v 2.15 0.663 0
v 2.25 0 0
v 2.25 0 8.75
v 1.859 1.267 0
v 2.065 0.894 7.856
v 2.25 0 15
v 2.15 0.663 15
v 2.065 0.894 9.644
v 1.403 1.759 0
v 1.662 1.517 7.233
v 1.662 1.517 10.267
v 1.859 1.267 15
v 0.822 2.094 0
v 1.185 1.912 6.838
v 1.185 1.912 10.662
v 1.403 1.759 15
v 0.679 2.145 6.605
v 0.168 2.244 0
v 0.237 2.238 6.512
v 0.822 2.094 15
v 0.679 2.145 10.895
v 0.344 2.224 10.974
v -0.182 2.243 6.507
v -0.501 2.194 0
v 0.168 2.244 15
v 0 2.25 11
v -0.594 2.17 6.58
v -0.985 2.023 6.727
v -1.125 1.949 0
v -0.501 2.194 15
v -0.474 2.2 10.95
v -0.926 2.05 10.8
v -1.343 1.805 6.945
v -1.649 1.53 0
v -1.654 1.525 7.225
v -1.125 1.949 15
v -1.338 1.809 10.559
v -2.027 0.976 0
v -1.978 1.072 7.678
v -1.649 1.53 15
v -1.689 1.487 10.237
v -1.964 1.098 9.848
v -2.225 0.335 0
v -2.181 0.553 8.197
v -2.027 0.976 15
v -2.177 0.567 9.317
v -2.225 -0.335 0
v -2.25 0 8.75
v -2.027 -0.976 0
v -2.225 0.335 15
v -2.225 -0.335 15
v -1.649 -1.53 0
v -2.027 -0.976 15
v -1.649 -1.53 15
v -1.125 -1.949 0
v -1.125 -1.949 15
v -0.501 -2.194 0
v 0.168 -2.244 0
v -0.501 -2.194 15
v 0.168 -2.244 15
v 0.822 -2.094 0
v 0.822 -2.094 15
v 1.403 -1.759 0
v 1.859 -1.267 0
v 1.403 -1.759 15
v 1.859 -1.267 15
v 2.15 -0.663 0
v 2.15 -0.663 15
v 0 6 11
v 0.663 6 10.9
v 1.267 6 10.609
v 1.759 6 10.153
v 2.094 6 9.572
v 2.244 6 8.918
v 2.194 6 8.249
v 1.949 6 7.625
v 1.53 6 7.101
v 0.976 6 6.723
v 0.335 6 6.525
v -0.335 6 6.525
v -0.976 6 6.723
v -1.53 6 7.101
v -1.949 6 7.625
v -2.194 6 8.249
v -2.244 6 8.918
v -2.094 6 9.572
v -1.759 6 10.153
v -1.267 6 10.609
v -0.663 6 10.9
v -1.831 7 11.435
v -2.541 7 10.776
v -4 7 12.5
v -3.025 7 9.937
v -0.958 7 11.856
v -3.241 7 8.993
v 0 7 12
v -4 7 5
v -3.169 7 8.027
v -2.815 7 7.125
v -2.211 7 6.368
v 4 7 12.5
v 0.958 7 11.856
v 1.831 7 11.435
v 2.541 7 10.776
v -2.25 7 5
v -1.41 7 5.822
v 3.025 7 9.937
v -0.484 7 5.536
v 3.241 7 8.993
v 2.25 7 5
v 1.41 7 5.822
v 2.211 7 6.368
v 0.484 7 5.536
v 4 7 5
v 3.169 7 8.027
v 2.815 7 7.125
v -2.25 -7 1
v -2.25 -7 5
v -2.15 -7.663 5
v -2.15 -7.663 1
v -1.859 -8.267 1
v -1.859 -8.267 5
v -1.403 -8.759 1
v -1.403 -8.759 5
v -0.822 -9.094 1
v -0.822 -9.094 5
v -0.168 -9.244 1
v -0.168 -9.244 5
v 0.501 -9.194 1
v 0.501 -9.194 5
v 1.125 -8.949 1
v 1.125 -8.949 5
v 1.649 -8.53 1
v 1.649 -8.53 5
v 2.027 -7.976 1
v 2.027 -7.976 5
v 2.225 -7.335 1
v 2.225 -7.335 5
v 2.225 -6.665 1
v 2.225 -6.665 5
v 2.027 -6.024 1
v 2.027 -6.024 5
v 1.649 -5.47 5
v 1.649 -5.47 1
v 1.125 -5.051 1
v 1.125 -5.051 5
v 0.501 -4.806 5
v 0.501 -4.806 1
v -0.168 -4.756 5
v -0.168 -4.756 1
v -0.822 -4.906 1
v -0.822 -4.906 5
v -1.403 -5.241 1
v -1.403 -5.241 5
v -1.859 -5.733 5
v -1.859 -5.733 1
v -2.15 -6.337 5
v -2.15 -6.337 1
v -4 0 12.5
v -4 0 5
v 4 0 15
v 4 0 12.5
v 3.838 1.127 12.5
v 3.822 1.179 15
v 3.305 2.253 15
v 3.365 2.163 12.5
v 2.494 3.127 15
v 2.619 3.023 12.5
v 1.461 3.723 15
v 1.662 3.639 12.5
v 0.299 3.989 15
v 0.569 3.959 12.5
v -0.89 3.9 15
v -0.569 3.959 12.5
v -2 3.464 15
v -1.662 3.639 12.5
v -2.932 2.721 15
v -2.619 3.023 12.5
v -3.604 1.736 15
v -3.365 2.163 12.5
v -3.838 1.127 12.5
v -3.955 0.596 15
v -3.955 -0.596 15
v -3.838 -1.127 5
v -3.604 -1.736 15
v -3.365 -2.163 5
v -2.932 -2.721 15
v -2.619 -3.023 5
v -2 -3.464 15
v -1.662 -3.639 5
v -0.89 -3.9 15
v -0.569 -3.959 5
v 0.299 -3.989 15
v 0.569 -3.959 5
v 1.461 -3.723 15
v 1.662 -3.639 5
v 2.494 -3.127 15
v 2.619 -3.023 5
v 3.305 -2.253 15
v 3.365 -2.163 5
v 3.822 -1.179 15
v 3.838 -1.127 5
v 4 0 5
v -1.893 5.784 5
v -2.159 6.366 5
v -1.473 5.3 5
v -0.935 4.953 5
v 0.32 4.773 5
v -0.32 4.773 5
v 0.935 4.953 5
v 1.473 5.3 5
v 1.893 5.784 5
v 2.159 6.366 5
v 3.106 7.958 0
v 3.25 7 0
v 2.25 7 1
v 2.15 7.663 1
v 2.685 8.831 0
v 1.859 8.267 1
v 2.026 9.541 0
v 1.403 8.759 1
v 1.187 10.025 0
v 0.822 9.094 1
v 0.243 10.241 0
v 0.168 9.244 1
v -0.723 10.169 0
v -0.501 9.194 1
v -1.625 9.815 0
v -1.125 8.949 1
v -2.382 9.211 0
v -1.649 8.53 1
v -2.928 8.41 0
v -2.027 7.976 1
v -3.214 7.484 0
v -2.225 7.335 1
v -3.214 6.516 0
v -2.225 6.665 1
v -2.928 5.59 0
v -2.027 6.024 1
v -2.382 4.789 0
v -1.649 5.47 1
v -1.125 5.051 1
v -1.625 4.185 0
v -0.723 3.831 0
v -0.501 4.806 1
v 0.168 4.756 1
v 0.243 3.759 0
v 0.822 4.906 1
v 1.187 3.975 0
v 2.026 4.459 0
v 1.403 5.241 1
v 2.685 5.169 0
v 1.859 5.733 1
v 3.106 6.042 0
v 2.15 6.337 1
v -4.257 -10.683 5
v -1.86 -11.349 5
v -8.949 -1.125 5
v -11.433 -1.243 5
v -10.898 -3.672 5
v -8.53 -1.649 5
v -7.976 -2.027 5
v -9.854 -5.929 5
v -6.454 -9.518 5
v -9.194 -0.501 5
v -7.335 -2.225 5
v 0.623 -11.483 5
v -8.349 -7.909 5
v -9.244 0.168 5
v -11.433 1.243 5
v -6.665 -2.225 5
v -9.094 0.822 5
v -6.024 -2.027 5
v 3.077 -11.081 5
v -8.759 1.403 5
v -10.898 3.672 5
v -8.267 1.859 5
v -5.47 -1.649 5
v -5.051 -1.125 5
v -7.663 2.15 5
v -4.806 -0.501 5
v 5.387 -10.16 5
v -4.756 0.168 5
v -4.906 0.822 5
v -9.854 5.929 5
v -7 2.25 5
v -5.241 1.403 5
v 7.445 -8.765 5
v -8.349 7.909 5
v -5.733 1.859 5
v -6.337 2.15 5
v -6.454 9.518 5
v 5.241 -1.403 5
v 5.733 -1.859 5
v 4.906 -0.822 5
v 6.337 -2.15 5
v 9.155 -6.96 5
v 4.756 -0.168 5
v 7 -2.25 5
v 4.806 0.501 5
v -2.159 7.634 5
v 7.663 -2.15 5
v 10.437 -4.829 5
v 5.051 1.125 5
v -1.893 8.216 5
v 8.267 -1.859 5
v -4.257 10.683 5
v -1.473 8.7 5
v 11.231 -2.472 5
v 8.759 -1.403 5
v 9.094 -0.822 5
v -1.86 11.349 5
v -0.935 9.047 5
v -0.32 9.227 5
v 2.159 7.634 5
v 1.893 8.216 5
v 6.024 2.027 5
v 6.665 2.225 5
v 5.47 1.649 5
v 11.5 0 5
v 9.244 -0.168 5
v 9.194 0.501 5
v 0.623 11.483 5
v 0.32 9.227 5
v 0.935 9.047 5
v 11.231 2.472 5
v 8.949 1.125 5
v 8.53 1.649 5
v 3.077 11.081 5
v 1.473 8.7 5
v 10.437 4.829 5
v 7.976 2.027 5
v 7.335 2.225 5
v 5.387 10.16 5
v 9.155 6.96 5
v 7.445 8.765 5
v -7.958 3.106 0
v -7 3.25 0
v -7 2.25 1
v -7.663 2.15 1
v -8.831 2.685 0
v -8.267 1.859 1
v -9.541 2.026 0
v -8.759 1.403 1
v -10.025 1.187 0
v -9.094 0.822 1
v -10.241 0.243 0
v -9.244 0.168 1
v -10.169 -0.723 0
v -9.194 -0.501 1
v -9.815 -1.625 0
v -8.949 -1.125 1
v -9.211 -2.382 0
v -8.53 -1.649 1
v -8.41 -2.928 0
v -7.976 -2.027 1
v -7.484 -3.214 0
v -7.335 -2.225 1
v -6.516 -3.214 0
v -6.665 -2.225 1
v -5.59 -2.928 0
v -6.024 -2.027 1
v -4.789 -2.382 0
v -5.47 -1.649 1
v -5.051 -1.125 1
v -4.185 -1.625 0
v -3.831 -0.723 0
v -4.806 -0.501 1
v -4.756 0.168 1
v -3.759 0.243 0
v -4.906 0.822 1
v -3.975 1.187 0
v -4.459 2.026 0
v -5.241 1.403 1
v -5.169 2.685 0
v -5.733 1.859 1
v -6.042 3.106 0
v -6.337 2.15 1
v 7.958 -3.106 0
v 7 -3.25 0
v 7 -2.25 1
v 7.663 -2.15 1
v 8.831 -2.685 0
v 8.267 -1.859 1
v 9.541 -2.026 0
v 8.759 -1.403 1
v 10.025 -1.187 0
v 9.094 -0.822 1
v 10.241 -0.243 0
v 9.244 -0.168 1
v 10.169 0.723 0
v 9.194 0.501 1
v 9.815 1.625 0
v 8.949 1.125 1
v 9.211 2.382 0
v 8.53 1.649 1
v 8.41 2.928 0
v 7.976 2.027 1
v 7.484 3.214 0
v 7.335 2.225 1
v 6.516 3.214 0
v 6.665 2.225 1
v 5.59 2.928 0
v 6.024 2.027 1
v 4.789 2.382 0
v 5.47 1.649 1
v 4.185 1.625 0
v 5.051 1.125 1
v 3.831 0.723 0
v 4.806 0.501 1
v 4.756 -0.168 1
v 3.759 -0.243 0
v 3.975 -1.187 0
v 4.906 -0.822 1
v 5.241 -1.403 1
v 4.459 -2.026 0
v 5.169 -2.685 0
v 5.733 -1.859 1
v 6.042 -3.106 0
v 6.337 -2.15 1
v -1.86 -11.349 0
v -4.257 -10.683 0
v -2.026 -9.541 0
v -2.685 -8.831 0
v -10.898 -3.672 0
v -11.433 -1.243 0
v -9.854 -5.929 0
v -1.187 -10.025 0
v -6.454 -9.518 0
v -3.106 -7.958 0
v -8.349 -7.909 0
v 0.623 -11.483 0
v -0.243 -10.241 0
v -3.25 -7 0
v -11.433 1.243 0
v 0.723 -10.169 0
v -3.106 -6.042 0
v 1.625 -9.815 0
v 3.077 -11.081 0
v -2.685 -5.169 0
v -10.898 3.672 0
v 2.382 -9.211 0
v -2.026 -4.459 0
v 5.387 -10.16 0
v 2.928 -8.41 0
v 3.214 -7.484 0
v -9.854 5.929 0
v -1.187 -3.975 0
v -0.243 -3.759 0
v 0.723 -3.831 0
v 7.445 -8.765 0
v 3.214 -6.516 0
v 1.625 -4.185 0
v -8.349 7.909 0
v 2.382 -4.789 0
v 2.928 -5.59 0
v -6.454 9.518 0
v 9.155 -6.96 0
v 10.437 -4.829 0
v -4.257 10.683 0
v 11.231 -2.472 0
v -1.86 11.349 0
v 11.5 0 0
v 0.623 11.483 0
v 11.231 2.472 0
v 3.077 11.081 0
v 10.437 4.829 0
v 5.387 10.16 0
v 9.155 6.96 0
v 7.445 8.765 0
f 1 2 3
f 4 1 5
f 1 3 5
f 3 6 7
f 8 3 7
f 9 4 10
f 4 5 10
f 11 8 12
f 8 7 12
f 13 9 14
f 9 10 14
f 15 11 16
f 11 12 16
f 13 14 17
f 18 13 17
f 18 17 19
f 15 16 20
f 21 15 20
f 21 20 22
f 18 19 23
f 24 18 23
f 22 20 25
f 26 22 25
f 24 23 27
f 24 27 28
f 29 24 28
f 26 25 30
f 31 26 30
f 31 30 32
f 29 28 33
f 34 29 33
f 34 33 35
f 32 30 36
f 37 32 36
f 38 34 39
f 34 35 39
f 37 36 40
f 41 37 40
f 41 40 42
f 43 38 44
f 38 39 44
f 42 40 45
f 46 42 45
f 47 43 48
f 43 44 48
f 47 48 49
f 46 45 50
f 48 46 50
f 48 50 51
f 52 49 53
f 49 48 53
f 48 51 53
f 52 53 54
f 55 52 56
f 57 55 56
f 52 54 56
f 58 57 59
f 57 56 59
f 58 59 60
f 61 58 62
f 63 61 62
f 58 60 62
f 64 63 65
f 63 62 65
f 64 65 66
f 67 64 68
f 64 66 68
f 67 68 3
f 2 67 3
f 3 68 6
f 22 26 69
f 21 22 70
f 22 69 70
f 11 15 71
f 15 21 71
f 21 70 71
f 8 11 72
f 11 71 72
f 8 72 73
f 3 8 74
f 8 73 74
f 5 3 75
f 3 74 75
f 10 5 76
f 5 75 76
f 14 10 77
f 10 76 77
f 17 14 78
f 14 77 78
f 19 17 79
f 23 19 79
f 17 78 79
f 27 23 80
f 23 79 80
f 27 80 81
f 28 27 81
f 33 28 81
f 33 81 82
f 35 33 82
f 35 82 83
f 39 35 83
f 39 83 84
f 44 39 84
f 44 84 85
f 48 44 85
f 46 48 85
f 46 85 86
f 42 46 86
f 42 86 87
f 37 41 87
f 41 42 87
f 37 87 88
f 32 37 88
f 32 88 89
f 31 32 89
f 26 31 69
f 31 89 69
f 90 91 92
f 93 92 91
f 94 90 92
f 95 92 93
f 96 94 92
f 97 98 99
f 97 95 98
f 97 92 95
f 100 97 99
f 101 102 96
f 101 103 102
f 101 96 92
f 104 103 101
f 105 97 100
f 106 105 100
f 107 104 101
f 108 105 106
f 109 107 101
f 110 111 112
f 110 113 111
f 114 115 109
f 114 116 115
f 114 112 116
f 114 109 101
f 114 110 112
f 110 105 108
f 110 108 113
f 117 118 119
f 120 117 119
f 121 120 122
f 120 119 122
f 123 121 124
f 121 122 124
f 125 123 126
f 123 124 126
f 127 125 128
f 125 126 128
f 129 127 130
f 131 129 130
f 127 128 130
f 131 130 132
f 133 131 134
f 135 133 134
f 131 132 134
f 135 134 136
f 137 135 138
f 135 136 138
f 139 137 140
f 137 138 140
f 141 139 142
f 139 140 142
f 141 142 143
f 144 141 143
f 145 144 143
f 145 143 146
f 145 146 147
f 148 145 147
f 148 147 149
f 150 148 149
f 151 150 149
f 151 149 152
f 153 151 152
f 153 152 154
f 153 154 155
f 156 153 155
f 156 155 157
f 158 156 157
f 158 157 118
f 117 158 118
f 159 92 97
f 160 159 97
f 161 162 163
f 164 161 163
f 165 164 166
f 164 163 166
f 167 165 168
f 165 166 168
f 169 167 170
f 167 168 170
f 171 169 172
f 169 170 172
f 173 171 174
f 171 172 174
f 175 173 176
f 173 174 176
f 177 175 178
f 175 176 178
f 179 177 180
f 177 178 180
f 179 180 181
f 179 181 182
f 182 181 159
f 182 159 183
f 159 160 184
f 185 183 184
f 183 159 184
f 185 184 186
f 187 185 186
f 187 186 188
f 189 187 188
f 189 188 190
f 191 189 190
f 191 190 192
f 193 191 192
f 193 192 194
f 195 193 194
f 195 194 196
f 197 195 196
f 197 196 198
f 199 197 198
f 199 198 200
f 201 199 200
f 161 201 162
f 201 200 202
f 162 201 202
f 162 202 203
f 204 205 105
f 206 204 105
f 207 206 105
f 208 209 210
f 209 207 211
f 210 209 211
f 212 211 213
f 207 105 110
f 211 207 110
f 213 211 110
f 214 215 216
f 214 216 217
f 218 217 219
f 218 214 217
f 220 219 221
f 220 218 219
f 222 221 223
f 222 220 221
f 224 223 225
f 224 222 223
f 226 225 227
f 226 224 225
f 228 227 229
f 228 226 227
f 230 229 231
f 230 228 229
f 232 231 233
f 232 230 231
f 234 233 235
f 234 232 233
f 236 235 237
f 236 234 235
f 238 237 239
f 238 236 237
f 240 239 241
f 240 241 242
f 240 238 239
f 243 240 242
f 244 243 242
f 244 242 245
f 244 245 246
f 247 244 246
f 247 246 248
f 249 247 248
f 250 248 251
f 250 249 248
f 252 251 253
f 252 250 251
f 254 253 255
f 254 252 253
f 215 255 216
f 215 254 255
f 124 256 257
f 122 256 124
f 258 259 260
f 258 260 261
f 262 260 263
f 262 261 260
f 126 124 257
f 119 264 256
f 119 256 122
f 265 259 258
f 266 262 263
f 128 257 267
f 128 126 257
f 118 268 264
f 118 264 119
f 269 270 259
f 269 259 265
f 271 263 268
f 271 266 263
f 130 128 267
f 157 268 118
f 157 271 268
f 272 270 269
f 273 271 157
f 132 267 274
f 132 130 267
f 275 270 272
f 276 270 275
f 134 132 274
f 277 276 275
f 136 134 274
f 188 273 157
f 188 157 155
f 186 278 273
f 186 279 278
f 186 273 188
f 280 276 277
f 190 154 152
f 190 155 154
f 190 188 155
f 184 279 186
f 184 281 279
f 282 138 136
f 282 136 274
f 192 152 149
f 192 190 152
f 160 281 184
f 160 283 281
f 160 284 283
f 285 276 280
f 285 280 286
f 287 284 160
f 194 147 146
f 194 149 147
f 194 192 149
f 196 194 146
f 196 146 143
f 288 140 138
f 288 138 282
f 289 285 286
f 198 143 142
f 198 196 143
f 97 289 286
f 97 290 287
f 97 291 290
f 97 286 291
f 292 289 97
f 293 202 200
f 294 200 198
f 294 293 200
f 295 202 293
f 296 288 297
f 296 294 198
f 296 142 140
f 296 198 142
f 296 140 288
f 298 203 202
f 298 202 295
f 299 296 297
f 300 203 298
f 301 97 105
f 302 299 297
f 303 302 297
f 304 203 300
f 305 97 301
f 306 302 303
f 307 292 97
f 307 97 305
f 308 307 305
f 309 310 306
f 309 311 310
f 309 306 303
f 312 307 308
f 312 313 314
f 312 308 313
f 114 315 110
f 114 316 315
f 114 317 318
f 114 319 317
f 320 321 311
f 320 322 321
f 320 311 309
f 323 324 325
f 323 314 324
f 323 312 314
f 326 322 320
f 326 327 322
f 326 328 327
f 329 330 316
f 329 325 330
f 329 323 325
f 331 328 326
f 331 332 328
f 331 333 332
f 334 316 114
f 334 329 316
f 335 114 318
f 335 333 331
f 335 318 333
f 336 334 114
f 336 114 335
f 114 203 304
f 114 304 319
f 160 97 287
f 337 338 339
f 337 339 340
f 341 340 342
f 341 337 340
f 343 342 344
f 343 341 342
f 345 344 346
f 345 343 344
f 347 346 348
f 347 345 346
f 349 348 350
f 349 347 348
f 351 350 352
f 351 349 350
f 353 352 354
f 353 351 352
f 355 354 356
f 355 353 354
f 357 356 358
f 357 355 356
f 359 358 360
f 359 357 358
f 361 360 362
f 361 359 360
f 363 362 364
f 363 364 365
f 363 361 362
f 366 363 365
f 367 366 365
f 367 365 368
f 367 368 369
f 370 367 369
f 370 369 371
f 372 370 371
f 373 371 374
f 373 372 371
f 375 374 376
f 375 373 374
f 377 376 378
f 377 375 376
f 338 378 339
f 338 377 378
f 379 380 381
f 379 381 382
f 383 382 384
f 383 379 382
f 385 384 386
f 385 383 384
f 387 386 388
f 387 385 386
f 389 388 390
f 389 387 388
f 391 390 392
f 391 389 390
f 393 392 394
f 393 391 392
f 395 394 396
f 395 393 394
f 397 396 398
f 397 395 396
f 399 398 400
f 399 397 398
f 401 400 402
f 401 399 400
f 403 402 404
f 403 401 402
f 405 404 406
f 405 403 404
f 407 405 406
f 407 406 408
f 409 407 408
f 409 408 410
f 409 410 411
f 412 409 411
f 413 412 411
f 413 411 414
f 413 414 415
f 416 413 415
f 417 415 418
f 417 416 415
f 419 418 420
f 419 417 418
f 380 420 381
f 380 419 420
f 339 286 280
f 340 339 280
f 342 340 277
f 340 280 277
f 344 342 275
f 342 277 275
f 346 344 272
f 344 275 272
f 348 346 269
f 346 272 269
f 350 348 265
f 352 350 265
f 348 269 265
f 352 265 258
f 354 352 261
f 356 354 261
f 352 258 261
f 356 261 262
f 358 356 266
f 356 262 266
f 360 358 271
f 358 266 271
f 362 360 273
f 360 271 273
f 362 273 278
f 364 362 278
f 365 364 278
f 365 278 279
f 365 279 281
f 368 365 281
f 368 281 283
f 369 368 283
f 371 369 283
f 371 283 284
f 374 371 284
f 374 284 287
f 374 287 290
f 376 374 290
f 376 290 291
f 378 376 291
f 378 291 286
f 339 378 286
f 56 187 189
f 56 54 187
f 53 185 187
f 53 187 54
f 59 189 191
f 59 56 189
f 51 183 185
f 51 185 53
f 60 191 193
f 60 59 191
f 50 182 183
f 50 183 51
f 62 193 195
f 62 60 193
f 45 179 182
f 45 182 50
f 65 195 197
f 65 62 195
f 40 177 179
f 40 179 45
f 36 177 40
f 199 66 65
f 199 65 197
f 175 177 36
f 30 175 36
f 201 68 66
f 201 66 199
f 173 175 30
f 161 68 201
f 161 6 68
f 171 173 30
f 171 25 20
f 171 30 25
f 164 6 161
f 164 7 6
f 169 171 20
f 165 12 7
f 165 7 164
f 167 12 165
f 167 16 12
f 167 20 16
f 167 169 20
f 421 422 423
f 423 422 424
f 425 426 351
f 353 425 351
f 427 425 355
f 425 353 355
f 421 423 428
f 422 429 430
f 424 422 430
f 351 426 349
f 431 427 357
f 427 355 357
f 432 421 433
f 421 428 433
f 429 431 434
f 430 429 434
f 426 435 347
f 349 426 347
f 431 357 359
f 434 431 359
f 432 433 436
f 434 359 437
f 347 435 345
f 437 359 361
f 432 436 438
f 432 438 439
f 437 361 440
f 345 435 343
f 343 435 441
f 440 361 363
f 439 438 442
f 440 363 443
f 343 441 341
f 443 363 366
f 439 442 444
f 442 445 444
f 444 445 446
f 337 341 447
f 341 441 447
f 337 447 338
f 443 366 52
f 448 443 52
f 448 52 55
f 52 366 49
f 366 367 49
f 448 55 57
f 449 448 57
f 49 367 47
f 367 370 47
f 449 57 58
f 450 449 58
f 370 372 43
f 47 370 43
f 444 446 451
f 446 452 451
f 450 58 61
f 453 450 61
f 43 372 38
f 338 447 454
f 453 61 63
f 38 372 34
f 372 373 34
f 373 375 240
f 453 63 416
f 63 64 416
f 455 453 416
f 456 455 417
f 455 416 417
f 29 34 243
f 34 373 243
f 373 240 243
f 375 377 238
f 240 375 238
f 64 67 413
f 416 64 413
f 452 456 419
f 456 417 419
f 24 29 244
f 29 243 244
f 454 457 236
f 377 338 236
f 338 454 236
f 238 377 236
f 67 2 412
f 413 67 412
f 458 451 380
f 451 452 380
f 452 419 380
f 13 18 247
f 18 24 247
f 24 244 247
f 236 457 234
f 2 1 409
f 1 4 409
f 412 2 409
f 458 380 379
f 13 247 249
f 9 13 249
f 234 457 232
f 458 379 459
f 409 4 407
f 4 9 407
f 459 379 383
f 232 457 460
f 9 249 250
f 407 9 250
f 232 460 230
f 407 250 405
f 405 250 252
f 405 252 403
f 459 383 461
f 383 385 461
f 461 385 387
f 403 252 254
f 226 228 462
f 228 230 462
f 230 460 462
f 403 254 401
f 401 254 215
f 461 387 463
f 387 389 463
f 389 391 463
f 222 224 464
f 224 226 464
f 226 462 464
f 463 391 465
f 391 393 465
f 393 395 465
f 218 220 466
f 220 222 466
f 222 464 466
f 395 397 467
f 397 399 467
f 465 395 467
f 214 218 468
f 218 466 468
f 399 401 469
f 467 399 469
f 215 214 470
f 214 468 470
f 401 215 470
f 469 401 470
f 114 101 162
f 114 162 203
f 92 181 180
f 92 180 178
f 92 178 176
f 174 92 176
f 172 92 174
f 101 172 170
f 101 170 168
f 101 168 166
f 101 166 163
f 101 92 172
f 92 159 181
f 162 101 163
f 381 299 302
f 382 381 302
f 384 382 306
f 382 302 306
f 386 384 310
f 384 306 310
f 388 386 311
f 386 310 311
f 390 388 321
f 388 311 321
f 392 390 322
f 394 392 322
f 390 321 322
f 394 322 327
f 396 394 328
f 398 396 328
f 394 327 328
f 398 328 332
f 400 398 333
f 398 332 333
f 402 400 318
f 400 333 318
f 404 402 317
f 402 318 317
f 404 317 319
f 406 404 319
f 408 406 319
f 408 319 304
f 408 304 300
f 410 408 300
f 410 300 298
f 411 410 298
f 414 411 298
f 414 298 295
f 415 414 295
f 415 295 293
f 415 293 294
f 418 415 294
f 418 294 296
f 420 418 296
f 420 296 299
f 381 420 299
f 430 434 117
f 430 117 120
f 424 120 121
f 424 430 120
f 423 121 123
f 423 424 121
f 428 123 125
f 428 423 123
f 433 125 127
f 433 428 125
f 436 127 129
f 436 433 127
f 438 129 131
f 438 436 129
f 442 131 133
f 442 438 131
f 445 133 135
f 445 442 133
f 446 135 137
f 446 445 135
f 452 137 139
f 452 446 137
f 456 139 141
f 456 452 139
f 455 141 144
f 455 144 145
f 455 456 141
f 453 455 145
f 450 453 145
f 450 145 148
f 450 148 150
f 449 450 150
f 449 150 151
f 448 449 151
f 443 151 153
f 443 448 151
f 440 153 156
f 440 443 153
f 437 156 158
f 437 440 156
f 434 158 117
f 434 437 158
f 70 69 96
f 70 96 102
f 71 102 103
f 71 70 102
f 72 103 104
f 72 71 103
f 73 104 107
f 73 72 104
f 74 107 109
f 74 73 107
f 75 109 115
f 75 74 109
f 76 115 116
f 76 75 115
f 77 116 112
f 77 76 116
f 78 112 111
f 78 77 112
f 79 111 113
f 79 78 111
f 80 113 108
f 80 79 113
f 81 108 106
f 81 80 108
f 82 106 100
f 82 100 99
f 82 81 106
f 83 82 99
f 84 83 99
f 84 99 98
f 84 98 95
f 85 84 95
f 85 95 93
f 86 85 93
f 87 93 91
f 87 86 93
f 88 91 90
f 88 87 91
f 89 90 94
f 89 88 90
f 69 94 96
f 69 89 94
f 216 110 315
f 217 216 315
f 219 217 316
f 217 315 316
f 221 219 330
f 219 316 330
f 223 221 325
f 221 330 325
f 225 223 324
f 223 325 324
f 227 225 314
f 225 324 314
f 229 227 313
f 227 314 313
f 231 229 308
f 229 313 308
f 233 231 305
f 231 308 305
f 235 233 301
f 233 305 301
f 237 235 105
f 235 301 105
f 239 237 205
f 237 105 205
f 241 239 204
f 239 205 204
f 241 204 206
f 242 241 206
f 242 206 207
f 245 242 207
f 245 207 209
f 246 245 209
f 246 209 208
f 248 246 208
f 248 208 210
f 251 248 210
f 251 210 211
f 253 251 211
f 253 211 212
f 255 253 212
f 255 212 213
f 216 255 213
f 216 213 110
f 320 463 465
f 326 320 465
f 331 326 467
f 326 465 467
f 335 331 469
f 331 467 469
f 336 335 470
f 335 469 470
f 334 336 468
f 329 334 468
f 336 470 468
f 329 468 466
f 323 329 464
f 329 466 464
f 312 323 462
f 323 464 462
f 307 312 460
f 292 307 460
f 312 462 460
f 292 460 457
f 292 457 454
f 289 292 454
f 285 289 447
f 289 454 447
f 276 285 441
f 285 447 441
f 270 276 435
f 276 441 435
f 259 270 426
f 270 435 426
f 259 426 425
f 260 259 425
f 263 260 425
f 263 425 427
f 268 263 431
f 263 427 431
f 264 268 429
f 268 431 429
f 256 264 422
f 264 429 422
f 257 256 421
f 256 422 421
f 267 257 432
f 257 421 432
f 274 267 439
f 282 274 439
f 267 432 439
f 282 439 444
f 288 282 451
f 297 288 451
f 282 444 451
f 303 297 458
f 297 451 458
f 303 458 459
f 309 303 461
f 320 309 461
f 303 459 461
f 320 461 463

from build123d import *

# Parameters (mm, degrees)
SKETCH1_R                = 11.5
BOSS_EXTRUDE1_DEPTH      = 5
SKETCH2_R                = 2.25
CUT_EXTRUDE1_DEPTH       = 18.014699527
CIRPATTERN1_COUNT        = 4
SKETCH3_R                = 4
BOSS_EXTRUDE2_DEPTH      = 10
SKETCH4_R                = 2.25
CUT_EXTRUDE2_DEPTH       = 23.12464689
BOSS_EXTRUDE3_REACH      = 28.448
BOSS_EXTRUDE3_END_RADIUS = 4
SKETCH5_W                = 8
SKETCH5_H                = 7.5
SKETCH6_R                = 2.25
CUT_EXTRUDE3_DEPTH       = 7
CHAMFER1_SIZE            = 1
CHAMFER2_SIZE            = 1


with BuildPart() as part:
    # Sketch1 → Boss-Extrude1 (new body)
    with BuildSketch(Plane.XY):
        Circle(SKETCH1_R)
    extrude(amount=BOSS_EXTRUDE1_DEPTH)

    # Sketch2 → Cut-Extrude1 (cut, through all)
    with BuildSketch(Plane.XY.offset(5)):
        with Locations((0, 7)):
            Circle(SKETCH2_R)
    cut_extrude1 = extrude(amount=-CUT_EXTRUDE1_DEPTH, mode=Mode.SUBTRACT)

    # CirPattern1: Cut-Extrude1 ×4 about axis
    cirpattern1_axis = Axis((0, 0, 0), (0, 0, 1))
    for i in range(1, CIRPATTERN1_COUNT):
        add(cut_extrude1.rotate(cirpattern1_axis, i * 360 / CIRPATTERN1_COUNT), mode=Mode.SUBTRACT)

    # Sketch3 → Boss-Extrude2 (add)
    with BuildSketch(Plane.XY.offset(5)):
        Circle(SKETCH3_R)
    extrude(amount=BOSS_EXTRUDE2_DEPTH)

    # Sketch4 → Cut-Extrude2 (cut, through all)
    with BuildSketch(Plane.XY.offset(15)):
        Circle(SKETCH4_R)
    extrude(amount=-CUT_EXTRUDE2_DEPTH, mode=Mode.SUBTRACT)

    # Boss-Extrude3: up to this cylinder (the profile starts outside it)
    boss_extrude3_end = Plane(origin=(0, 0, 8.75), z_dir=(0, 0, -1)) * Cylinder(BOSS_EXTRUDE3_END_RADIUS, 65.896, mode=Mode.PRIVATE)
    # Sketch5 → Boss-Extrude3 (add, up to the surface)
    with BuildSketch(Plane(origin=(0, 7, 0), x_dir=(1, 0, 0), z_dir=(0, 1, 0)), mode=Mode.PRIVATE) as boss_extrude3_sk1:
        with Locations((0, -8.75)):
            Rectangle(SKETCH5_W, SKETCH5_H)
    boss_extrude3_tool1 = extrude(boss_extrude3_sk1.sketch, amount=-BOSS_EXTRUDE3_REACH, mode=Mode.PRIVATE) - boss_extrude3_end
    add(boss_extrude3_tool1.solids().sort_by_distance((0, 7, 8.75))[0])

    # Sketch6 → Cut-Extrude3 (cut)
    with BuildSketch(Plane(origin=(0, 7, 0), x_dir=(1, 0, 0), z_dir=(0, 1, 0))):
        with Locations(Location((0, -8.75, 0), (0, 0, 270))):
            Circle(SKETCH6_R)
    extrude(amount=-CUT_EXTRUDE3_DEPTH, mode=Mode.SUBTRACT)

    # Chamfer1
    chamfer1_edges = [part.edges().sort_by_distance(p)[0] for p in [
        (0, 7, 6.5),
    ]]
    chamfer(chamfer1_edges, length=CHAMFER1_SIZE)

    # Chamfer2
    chamfer2_edges = [part.edges().sort_by_distance(p)[0] for p in [
        (-7, -2.25, 0),
        (2.25, -7, 0),
        (7, 2.25, 0),
        (-2.25, 7, 0),
    ]]
    chamfer(chamfer2_edges, length=CHAMFER2_SIZE)


solid = part.part
